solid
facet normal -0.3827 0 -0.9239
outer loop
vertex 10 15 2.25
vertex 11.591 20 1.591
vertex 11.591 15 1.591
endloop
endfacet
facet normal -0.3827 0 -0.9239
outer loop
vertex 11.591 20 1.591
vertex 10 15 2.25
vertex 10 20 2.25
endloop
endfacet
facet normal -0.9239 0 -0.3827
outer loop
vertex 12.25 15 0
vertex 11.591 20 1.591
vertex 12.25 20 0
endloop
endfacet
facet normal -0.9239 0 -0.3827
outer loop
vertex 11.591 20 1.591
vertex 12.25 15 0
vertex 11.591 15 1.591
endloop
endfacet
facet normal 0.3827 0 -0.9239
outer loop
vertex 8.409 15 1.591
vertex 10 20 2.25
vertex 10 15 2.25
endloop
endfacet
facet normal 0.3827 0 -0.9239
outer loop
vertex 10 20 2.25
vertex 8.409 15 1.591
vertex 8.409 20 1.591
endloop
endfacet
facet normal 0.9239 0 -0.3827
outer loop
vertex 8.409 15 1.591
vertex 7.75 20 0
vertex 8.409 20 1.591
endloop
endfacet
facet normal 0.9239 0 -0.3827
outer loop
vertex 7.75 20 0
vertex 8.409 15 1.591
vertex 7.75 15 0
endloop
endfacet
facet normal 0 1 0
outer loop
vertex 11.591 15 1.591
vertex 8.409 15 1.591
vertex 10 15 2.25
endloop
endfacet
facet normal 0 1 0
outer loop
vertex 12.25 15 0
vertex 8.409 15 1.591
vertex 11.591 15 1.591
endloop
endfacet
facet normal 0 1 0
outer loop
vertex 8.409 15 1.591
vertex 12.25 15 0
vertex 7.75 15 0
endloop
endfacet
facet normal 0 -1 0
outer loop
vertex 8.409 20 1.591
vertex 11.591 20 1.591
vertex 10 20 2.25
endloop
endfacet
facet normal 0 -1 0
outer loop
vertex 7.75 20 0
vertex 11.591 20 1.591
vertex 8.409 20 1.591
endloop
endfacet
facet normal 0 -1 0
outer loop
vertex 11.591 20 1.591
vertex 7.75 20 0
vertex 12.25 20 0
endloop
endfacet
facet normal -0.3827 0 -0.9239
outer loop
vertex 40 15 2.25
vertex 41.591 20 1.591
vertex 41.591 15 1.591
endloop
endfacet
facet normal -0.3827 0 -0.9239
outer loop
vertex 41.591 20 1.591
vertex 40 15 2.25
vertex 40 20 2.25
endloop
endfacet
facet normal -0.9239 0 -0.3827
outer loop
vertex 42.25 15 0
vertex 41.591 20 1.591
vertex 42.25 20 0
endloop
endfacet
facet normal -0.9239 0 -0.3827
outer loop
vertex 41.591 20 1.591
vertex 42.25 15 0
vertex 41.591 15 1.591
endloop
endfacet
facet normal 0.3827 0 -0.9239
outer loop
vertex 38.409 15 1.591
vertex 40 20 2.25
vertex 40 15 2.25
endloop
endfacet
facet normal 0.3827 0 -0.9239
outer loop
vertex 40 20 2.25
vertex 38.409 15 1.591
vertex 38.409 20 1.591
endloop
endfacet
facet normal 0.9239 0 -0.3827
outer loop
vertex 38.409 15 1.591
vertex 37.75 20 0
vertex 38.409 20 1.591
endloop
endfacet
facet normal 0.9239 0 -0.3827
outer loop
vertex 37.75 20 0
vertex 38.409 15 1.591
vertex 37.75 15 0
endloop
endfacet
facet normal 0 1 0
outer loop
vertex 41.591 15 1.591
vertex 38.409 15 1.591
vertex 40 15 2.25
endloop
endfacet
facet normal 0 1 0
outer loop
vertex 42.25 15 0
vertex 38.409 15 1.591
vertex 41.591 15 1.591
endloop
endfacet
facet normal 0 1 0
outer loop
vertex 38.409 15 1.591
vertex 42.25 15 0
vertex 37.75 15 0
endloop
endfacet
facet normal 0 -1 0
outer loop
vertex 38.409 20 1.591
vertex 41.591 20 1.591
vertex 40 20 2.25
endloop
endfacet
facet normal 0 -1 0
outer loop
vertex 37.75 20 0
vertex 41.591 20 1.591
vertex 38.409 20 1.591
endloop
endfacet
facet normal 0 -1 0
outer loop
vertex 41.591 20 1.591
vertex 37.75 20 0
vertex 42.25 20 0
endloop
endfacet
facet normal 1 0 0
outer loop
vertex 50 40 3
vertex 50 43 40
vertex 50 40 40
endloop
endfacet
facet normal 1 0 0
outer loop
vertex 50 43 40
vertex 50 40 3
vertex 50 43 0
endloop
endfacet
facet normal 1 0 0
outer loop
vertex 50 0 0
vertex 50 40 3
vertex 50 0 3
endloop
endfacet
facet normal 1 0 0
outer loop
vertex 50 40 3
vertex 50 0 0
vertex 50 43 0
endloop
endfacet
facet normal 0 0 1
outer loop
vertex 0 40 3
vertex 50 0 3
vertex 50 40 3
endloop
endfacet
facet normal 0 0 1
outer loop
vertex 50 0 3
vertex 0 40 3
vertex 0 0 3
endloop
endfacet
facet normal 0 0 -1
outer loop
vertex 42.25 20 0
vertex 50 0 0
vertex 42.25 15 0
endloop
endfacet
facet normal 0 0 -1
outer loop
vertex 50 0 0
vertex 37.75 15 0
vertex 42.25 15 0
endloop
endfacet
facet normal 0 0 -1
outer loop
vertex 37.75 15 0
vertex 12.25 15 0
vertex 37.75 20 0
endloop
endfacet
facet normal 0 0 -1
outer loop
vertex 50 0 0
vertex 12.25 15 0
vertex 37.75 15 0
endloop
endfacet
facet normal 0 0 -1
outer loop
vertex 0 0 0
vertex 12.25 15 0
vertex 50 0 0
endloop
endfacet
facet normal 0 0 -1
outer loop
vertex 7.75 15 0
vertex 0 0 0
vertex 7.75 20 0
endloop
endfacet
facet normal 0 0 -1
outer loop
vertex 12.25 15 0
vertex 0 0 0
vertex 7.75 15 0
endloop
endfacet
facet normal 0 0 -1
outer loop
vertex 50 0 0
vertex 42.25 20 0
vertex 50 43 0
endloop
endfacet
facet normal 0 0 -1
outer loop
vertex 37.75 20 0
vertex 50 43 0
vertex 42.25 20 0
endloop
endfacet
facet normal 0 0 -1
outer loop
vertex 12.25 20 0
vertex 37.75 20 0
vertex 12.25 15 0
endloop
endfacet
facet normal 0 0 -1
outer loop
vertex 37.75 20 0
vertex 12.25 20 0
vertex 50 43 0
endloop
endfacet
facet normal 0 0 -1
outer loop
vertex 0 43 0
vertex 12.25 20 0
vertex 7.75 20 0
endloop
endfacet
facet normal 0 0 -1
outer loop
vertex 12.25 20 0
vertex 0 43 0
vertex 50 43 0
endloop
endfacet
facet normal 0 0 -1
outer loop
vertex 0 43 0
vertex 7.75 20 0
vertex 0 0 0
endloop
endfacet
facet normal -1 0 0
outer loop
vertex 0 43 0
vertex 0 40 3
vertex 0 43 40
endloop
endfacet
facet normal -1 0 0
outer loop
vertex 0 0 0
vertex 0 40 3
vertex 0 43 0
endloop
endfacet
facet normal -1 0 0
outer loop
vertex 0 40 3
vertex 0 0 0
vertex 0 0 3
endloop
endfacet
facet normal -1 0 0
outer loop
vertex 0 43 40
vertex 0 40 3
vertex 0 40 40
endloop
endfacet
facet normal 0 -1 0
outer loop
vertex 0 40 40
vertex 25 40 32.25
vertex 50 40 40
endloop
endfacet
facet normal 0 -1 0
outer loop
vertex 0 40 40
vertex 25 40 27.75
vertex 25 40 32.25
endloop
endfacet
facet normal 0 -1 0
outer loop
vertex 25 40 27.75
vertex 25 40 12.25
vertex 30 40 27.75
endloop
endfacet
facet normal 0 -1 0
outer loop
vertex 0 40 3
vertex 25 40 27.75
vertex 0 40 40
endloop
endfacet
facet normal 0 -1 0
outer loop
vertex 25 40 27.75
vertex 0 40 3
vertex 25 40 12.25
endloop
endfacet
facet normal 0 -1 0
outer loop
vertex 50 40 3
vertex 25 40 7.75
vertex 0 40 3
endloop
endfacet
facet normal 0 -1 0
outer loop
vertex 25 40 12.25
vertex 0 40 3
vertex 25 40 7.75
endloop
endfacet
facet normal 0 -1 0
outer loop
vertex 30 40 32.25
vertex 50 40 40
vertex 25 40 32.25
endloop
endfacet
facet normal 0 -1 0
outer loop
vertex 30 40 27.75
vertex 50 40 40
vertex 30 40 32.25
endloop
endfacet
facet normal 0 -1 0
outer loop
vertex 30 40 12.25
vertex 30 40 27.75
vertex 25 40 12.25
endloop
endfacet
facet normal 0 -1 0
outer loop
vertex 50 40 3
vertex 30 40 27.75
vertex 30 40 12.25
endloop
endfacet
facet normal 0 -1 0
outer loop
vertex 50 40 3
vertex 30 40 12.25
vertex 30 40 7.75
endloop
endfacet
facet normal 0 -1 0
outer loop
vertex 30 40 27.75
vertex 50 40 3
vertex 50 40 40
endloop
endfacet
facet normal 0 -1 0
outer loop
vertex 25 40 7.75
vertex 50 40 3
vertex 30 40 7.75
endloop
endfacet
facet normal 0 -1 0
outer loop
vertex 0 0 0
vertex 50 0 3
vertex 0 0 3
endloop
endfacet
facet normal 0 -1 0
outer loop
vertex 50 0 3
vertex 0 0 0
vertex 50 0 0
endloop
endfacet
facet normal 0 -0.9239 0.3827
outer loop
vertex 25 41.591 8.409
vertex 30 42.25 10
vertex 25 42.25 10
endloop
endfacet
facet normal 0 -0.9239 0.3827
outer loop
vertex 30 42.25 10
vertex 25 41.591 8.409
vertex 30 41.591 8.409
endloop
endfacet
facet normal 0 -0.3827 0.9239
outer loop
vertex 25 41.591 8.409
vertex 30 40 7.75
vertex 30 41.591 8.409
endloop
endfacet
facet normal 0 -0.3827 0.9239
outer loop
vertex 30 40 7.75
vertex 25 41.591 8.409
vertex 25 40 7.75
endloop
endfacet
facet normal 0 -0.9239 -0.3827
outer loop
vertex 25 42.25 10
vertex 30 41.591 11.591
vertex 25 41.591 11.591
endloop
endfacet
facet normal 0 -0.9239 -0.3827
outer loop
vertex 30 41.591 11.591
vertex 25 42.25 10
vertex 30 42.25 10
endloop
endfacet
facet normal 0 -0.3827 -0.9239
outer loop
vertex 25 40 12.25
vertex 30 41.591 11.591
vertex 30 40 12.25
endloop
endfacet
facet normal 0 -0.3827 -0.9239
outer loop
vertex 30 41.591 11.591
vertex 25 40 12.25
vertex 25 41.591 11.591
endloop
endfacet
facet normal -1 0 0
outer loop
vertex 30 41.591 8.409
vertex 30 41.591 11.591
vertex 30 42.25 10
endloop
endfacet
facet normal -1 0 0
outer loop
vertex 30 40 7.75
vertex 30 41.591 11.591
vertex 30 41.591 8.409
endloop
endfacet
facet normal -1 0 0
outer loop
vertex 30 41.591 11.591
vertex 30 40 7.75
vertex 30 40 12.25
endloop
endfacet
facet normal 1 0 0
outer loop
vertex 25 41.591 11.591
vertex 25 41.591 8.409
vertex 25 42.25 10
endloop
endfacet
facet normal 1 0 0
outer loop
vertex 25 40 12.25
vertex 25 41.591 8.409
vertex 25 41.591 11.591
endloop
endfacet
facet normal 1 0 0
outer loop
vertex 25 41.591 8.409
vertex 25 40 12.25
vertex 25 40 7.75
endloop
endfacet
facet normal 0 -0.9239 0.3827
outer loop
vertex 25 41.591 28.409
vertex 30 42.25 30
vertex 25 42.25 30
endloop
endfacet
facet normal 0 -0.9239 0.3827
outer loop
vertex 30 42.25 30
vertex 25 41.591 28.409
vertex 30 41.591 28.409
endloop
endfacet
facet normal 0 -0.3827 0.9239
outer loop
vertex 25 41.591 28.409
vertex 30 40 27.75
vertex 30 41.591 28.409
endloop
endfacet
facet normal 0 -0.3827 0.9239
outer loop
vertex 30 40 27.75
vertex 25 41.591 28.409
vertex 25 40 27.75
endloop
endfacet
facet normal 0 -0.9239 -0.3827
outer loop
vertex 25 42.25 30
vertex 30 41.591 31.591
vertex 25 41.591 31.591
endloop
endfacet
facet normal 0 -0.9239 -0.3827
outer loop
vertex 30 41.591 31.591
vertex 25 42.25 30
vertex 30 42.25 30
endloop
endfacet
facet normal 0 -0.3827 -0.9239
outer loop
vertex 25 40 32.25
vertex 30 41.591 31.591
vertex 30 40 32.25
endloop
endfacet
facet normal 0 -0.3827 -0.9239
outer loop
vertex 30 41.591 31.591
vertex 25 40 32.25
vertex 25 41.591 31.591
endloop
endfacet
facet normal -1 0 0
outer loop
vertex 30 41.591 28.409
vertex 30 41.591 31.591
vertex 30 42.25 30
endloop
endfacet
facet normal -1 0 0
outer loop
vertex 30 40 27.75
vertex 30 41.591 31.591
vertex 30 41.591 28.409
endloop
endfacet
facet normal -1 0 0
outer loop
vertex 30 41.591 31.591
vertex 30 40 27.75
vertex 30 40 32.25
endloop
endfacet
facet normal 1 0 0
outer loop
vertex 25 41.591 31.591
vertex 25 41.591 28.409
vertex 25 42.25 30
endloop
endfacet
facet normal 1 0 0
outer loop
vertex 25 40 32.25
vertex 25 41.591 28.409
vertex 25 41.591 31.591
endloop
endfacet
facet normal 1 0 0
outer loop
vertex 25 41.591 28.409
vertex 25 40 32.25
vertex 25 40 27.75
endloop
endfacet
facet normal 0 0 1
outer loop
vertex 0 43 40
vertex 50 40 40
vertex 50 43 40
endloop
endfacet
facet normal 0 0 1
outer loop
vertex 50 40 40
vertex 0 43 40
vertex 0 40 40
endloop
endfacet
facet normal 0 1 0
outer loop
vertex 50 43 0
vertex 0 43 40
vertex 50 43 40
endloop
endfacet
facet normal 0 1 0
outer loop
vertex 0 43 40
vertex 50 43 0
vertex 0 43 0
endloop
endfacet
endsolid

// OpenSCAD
// L-bracket parameters
width = 50;
depth = 40;
height = 40;
thickness = 3;
screw_diameter = 4.5;
countersink_diameter = 8;
countersink_depth = 2;
hole_offset = 10;

// Module for creating a countersunk hole
module countersunk_hole(diameter, depth) {
  difference() {
    cylinder(h=thickness + depth, r=diameter/2);
    translate([0, 0, -depth]) cylinder(h=depth, r=(countersink_diameter)/2);
  }
}

// Horizontal flange
module horizontal_flange() {
  difference() {
    cube([width, depth, thickness]);
    // Countersunk holes on the top face
    translate([hole_offset, depth/2, 0]) rotate([90,0,0]) countersunk_hole(screw_diameter, countersink_depth);
    translate([width - hole_offset, depth/2, 0]) rotate([90,0,0]) countersunk_hole(screw_diameter, countersink_depth);
  }
}

// Vertical flange
module vertical_flange() {
  difference() {
    cube([width, thickness, height]);
    // Countersunk holes on the front face
    translate([width/2, 0, hole_offset]) rotate([0,90,0]) countersunk_hole(screw_diameter, countersink_depth);
    translate([width/2, 0, height - hole_offset]) rotate([0,90,0]) countersunk_hole(screw_diameter, countersink_depth);
  }
}

// Combine the flanges to create the L-bracket
union() {
  horizontal_flange();
  translate([0, depth, 0]) vertical_flange();
}
